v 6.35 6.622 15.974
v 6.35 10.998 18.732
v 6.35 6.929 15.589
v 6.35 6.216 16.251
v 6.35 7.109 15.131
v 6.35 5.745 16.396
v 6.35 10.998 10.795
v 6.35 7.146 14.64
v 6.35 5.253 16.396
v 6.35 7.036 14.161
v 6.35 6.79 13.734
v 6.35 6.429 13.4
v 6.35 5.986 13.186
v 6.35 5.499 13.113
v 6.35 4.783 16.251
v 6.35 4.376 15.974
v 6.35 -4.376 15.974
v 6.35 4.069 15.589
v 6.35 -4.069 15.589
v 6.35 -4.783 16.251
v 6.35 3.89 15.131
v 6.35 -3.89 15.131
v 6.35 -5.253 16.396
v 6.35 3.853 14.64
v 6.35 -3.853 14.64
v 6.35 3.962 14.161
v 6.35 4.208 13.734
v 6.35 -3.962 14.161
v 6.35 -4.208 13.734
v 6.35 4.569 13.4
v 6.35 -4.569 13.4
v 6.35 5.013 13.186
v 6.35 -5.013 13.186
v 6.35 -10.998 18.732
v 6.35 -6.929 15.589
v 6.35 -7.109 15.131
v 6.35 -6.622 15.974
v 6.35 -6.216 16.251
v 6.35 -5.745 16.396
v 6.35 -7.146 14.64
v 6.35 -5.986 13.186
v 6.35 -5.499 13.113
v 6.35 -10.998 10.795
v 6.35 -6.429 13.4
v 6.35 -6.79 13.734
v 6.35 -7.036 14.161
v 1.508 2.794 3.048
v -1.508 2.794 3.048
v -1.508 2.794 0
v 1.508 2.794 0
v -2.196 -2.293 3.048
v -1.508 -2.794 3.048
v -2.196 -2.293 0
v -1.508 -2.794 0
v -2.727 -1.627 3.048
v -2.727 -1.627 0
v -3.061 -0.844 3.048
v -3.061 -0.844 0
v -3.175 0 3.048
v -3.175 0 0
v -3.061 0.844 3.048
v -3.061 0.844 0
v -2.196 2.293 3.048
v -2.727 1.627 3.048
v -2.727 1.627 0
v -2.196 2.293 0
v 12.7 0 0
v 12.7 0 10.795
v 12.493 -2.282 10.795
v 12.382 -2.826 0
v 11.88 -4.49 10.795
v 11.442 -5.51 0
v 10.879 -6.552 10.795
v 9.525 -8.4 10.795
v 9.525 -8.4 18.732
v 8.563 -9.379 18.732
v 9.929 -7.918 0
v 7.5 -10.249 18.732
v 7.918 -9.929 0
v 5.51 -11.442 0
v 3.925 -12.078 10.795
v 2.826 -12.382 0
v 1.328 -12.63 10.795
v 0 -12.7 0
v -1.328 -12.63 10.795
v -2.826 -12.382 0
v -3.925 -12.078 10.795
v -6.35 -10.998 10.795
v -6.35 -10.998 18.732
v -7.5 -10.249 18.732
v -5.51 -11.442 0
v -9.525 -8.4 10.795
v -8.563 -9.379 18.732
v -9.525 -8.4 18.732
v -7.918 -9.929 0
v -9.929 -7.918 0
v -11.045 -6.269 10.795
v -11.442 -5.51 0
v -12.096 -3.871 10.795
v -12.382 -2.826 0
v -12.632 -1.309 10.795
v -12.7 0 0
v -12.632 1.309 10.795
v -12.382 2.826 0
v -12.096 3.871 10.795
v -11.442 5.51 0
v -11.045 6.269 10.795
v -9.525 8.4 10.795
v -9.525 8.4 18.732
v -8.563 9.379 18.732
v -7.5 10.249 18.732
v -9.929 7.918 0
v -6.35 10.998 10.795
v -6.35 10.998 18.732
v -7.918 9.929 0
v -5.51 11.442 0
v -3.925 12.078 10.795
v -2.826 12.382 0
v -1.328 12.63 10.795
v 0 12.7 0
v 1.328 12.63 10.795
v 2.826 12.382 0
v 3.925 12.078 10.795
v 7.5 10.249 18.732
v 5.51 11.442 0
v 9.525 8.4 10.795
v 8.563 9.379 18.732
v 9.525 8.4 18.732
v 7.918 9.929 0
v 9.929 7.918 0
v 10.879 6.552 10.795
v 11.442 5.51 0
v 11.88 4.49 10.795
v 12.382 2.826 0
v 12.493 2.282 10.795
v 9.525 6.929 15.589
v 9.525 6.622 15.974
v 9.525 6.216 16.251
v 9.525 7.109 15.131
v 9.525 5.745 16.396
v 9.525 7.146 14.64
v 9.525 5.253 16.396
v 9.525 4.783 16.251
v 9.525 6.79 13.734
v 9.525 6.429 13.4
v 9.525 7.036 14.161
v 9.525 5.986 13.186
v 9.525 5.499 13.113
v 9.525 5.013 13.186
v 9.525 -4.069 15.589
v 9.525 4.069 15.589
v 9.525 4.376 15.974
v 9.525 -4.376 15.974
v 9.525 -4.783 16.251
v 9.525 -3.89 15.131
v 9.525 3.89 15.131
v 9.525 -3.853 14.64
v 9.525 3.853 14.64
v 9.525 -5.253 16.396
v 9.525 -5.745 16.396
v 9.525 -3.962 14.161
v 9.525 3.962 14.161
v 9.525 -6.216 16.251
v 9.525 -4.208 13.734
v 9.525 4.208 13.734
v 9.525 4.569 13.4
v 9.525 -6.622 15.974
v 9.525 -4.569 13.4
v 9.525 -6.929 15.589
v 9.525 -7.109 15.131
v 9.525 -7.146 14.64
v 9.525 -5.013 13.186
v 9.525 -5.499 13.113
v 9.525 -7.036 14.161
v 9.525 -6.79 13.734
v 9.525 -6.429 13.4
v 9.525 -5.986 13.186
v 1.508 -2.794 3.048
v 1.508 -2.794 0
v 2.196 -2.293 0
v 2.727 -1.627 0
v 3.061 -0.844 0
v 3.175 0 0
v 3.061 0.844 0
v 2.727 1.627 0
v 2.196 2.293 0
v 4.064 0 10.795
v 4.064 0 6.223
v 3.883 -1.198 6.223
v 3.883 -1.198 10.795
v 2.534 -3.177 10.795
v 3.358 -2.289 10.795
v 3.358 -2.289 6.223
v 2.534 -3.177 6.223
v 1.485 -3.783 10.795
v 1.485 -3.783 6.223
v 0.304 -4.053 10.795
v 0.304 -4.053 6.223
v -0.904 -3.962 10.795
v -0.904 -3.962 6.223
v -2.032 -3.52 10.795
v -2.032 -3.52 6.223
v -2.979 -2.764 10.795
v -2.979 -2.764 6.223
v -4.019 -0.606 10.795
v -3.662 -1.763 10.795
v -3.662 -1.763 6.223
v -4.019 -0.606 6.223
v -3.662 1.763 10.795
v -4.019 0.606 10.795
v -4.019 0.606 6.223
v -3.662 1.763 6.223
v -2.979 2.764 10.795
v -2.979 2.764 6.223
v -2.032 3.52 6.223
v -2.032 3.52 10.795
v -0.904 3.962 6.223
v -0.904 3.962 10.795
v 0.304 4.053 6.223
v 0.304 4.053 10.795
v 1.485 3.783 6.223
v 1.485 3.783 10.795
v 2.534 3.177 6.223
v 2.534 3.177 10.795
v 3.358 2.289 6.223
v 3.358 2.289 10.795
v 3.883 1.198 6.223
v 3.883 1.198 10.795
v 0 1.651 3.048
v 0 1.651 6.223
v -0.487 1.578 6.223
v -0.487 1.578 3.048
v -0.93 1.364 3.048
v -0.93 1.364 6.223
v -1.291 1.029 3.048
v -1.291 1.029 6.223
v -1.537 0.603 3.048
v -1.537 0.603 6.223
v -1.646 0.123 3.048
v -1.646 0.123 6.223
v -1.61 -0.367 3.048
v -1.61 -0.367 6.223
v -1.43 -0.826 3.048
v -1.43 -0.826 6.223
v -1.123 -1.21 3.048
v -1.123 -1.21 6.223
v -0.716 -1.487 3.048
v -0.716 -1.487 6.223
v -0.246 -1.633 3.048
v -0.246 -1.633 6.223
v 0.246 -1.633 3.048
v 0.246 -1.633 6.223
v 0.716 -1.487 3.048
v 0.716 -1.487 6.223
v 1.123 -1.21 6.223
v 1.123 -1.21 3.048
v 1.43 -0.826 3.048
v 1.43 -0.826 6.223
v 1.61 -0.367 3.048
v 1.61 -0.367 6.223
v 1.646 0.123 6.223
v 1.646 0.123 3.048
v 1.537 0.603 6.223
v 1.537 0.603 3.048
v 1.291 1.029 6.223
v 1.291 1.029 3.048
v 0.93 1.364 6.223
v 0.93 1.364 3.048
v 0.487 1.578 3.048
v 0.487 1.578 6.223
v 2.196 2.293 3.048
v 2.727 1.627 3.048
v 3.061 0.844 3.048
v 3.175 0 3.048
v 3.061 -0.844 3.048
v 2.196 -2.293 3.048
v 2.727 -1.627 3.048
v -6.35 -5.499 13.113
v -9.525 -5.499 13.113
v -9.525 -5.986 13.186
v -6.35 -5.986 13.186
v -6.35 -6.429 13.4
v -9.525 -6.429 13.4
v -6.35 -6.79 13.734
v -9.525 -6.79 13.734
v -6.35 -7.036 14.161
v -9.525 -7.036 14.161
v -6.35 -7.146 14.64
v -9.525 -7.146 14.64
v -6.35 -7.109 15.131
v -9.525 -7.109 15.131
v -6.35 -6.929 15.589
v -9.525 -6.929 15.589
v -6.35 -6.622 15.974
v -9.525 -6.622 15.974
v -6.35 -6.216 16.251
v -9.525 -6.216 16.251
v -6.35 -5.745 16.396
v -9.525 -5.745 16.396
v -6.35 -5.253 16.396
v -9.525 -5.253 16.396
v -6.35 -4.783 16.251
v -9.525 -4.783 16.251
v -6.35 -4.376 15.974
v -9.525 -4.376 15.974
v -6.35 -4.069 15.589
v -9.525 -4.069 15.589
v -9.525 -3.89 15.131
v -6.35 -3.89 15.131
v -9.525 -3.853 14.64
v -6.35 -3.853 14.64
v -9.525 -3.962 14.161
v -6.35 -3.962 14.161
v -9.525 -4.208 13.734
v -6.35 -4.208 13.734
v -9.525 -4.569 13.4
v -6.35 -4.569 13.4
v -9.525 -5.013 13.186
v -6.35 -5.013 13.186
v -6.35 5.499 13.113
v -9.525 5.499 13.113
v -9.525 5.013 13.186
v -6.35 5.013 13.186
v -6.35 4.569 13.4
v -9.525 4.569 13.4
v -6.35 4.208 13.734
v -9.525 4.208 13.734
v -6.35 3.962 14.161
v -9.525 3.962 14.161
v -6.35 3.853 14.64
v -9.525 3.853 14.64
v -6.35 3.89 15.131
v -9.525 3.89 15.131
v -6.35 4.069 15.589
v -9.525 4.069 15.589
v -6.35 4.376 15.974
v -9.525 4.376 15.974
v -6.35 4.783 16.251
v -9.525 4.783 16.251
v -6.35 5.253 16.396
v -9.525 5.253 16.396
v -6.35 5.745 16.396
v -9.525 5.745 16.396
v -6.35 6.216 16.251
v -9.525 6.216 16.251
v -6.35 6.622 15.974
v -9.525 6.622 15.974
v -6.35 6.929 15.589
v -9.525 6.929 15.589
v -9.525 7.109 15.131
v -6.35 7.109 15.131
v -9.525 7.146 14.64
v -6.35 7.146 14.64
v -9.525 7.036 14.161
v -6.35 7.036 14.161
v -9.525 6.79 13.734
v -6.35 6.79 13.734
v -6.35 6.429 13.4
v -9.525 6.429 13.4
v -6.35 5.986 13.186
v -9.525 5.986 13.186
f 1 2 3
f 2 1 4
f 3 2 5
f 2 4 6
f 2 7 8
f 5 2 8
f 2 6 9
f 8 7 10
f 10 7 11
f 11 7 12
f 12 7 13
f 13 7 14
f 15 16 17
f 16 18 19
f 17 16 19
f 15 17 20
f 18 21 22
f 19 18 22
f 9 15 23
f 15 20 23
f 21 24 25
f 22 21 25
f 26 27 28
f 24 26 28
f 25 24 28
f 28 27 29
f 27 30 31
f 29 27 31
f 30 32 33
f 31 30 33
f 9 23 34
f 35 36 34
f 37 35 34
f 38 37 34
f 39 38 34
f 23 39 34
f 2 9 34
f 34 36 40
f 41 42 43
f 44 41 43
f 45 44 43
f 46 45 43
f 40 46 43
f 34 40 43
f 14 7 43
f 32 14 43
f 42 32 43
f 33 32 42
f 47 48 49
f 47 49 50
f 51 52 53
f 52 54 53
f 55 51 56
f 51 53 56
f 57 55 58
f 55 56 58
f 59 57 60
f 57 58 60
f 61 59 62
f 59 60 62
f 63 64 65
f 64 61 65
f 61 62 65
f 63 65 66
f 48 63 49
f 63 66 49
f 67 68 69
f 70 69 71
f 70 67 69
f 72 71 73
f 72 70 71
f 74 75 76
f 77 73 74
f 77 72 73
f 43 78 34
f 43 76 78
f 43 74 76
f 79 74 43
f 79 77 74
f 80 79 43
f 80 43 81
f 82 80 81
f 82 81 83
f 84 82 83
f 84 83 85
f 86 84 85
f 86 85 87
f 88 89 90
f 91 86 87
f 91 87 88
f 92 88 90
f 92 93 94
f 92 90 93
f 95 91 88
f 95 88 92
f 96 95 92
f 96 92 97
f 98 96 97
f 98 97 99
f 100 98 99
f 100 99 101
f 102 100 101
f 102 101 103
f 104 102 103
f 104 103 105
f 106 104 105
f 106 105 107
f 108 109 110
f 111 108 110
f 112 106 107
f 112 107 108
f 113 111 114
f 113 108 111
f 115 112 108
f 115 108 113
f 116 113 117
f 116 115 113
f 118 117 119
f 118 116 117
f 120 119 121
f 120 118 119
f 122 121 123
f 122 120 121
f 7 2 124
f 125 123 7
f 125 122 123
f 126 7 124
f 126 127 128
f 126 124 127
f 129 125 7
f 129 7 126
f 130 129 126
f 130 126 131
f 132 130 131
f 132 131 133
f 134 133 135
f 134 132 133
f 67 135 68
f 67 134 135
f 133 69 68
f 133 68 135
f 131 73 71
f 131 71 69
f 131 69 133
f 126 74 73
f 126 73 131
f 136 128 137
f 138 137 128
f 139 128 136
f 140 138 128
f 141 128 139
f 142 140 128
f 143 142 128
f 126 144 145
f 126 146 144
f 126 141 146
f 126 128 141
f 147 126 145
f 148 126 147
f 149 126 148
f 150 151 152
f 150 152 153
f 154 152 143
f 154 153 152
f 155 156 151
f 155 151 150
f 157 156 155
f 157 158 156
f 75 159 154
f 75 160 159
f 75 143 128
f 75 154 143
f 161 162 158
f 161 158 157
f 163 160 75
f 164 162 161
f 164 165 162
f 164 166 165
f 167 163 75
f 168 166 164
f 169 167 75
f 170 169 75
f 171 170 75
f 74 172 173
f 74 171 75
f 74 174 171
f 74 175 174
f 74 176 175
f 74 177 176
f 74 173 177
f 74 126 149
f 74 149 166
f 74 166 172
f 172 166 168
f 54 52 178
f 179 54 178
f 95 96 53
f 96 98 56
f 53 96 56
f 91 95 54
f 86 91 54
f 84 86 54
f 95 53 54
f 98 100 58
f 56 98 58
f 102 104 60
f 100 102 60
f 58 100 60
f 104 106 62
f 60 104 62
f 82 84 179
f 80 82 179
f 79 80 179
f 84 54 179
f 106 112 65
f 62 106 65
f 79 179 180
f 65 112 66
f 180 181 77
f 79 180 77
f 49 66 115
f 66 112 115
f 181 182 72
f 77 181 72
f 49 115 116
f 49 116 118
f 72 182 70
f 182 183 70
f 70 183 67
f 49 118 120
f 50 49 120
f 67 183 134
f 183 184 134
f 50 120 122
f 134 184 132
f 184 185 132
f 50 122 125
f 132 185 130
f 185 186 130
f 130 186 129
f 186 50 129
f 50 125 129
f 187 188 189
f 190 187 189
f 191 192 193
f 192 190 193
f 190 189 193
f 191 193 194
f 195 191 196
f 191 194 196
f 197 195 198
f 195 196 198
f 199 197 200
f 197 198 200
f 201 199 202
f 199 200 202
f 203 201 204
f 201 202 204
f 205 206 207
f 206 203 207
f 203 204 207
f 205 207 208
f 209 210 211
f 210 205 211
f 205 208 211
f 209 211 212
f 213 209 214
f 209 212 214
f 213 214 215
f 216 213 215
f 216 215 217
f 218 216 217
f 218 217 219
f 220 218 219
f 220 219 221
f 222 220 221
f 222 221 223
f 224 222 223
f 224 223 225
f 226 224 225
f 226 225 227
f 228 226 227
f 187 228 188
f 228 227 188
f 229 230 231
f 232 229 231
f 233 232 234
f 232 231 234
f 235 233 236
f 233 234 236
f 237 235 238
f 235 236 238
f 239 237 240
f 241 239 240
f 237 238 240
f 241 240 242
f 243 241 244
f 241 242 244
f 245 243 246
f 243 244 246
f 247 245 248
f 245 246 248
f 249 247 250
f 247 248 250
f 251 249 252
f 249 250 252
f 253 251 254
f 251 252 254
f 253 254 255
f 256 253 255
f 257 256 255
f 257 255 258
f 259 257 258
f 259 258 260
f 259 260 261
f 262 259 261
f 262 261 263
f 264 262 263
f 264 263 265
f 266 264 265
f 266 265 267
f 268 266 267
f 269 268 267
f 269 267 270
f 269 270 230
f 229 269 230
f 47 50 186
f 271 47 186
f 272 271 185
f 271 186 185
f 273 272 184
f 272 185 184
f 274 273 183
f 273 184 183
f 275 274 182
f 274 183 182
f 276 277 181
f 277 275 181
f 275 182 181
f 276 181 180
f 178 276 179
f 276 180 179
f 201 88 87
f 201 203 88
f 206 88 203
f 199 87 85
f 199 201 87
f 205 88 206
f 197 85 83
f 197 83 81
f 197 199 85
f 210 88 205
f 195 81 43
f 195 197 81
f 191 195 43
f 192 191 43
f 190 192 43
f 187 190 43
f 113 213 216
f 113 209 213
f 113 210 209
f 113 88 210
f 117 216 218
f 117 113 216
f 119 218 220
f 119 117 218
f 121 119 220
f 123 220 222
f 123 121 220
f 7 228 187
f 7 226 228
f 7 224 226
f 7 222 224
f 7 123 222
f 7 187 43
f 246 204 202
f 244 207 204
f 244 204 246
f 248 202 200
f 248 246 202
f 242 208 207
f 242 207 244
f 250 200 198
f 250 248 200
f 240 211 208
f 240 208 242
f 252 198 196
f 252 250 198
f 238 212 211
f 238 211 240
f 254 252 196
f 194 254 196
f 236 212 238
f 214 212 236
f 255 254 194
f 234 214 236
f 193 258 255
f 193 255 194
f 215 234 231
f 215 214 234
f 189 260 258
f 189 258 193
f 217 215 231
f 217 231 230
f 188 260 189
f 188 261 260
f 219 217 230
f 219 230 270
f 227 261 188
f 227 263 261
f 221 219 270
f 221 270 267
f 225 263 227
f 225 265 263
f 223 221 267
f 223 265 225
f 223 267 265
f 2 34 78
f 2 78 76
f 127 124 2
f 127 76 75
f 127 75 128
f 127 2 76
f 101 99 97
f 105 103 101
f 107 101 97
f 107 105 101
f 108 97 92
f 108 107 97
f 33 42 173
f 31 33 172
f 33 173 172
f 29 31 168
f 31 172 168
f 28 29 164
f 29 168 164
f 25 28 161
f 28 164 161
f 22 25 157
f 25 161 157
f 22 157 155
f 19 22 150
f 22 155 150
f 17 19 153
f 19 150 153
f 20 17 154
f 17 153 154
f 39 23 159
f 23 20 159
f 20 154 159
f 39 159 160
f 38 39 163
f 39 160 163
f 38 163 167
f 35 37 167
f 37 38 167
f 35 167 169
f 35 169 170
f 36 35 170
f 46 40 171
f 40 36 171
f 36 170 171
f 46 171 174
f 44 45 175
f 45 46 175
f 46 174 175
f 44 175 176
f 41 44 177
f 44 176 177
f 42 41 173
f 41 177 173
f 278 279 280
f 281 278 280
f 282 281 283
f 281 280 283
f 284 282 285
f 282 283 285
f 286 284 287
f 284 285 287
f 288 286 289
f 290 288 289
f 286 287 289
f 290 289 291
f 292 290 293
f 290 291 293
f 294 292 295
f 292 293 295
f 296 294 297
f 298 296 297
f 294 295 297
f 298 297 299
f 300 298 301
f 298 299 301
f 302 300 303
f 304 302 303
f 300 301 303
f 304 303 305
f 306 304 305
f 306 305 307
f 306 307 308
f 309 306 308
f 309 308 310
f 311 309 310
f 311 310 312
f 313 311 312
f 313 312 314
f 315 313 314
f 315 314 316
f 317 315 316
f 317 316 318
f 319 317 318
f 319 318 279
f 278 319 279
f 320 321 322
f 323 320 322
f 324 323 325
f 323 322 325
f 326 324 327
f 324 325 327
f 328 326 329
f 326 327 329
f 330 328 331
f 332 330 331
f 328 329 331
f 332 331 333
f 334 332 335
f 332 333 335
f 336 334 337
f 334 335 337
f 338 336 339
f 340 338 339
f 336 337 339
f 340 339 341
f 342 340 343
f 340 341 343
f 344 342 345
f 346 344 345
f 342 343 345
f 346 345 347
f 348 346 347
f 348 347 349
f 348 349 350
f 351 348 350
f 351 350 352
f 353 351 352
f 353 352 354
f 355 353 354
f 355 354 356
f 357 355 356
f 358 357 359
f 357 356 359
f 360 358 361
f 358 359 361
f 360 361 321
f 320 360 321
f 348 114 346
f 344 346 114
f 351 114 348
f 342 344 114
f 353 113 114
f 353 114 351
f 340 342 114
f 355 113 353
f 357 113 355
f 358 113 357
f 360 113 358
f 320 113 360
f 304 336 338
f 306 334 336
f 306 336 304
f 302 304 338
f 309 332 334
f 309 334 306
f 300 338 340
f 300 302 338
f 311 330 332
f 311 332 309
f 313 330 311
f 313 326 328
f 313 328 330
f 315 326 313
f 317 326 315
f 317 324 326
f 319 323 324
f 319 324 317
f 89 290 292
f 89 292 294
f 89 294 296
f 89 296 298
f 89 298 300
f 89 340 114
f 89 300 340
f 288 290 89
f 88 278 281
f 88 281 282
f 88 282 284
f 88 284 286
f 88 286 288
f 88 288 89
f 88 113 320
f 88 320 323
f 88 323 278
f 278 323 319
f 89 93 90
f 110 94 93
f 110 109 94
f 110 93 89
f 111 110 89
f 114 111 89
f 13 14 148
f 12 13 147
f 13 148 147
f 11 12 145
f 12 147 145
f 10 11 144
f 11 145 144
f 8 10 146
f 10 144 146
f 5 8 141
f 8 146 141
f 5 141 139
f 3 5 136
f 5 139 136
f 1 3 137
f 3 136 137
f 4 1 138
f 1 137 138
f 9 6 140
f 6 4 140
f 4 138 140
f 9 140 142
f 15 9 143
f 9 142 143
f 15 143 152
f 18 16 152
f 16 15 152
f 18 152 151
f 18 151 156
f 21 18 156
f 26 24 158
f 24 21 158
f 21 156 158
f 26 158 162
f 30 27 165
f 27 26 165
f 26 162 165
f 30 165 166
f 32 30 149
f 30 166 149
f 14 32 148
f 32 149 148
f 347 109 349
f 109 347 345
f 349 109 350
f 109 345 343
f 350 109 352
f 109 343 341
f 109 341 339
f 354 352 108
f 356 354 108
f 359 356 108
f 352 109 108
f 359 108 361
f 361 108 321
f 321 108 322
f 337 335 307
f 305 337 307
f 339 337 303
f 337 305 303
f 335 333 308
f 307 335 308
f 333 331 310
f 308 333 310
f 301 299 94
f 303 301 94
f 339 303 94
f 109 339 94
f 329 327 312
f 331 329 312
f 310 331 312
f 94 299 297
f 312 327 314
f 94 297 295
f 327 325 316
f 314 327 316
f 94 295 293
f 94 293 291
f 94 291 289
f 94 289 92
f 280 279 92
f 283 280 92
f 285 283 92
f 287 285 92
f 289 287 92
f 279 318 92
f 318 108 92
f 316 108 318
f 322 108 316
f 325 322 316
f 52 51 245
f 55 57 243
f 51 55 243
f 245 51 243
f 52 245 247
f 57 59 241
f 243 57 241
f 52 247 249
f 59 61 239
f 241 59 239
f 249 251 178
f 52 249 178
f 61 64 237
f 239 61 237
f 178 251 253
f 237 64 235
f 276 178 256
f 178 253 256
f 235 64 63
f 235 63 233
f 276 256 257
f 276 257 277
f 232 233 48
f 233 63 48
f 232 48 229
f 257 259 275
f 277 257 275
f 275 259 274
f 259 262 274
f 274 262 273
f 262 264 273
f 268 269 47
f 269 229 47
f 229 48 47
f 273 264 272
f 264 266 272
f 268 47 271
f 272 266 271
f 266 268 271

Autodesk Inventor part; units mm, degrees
ref_plane "YZ Plane" through (0, 0, 0) normal (1, 0, 0) x (0, 1, 0)
ref_plane "XZ Plane" through (0, 0, 0) normal (0, 1, 0) x (-1, 0, 0)
sketch "Sketch1" plane through (0, 0, 0) normal (0, 0, 1) x (1, 0, 0)
  arc A0 (-1.508, 2.794) -> (-1.508, -2.794) centre (0, 0) ccw
  line L0 (-3.175, 0) -> (0, 0) construction
  line L1 (0, 0) -> (3.175, 0) construction
  line L2 (-1.508, 2.794) -> (1.508, 2.794)
  line L3 (-1.508, -2.794) -> (1.508, -2.794)
  arc A1 (1.508, 2.794) -> (-1.508, 2.794) centre (0, 0) ccw construction
  arc A2 (1.508, -2.794) -> (1.508, 2.794) centre (0, 0) ccw
  arc A3 (-1.508, -2.794) -> (1.508, -2.794) centre (0, 0) ccw construction
  circle A4 centre (0, 0) radius 3.429 construction
  circle A5 centre (0, 0) radius 4.064
  circle A6 centre (0, 0) radius 12.7
  dimension "d1" = 2.794
  dimension "d2" = 3.175
  dimension "d3" = 6.858
  dimension "d5" = 0.635
  dimension "d6" = 25.4
extrude "Extrusion1" add sketch "Sketch1" along normal blind 3.048 contours A5 | A6
sketch "Sketch2" plane through (0, 0, 3.048) normal (0, 0, 1) x (1, 0, 0)
  circle A0 centre (0, 0) radius 12.7 projected
  arc A1 (-1.508, 2.794) -> (-1.508, -2.794) centre (0, 0) ccw projected
extrude "Extrusion2" add sketch "Sketch2" along normal blind 3.175
hole "Hole1" at (0, 0, 3.048) direction (0, 0, 1) diameter 3.302 depth 25.4 tip angle 118 thread size "8-32 UNC" class "2B" standard "ANSI Unified Screw Threads"
sketch "Sketch3" plane through (0, 0, 6.223) normal (0, 0, 1) x (1, 0, 0)
  circle A0 centre (0, 0) radius 12.7 projected
  circle A1 centre (0, 0) radius 3.429
  circle A2 centre (0, 0) radius 4.064
  dimension "d18" = 6.858
  dimension "d19" = 0.635
extrude "Extrusion3" add sketch "Sketch3" along normal blind 4.572 contours A0
sketch "Sketch4" plane through (0, 0, 10.795) normal (0, 0, 1) x (1, 0, 0)
  circle A0 centre (0, 0) radius 4.064 projected
  circle A1 centre (0, 0) radius 12.7 projected
  line L0 (-6.35, 10.9985) -> (-6.35, -10.9985)
  line L1 (0, 12.7) -> (0, -12.7)
  line L2 (6.35, 10.9985) -> (6.35, -10.9985)
  line L3 (-9.525, 8.4003) -> (-9.525, -8.4003)
  line L4 (9.525, 8.4003) -> (9.525, -8.4003)
  dimension "d22" = 6.35
  dimension "d23" = 3.175
extrude "Extrusion4" add sketch "Sketch4" along normal blind 7.9375 contours A1 L4 L2 | L0 A1 L3
sketch "Sketch5" plane through (-6.35, -10.9985, 10.795) normal (1, 0, 0) x (0, 0, -1)
  line L0 (0, 21.997) -> (0, 0) projected
  line L1 (0, 21.997) -> (-7.9375, 21.997) projected
  line L2 (-7.9375, 0) -> (-7.9375, 21.997) projected
  line L3 (0, 0) -> (-7.9375, 0) projected
  line L4 (-3.9688, 21.997) -> (-3.9688, 0) construction
  line L5 (-7.9375, 10.9985) -> (0, 10.9985) construction
  line L6 (-7.9375, 16.4978) -> (0, 16.4978) construction
  line L7 (-7.9375, 5.4993) -> (0, 5.4993) construction
  point P0 (10.795, 10.9985)
  point P1 (-3.9688, 16.4978)
  point P2 (-3.9688, 5.4993)
  dimension "d26" = 5.4993
  dimension "d27" = 5.4993
hole "Hole2" at (-6.35, 5.4993, 14.7638) at (-6.35, -5.4993, 14.7638) direction (-1, 0, 0) diameter 3.302 end through all thread size "8-32 UNC" class "2B" standard "ANSI Unified Screw Threads"
ref_plane "Work Plane1" through (0, -10.9985, 10.795) normal (1, 0, 0) x (0, 0, -1)
mirror "Mirror1" about plane through (0, -10.9985, 10.795) normal (1, 0, 0) of "Hole2"
equation "\"d26\" = d27"
properties part number "Pneumatic Connector -Actuator Side"
